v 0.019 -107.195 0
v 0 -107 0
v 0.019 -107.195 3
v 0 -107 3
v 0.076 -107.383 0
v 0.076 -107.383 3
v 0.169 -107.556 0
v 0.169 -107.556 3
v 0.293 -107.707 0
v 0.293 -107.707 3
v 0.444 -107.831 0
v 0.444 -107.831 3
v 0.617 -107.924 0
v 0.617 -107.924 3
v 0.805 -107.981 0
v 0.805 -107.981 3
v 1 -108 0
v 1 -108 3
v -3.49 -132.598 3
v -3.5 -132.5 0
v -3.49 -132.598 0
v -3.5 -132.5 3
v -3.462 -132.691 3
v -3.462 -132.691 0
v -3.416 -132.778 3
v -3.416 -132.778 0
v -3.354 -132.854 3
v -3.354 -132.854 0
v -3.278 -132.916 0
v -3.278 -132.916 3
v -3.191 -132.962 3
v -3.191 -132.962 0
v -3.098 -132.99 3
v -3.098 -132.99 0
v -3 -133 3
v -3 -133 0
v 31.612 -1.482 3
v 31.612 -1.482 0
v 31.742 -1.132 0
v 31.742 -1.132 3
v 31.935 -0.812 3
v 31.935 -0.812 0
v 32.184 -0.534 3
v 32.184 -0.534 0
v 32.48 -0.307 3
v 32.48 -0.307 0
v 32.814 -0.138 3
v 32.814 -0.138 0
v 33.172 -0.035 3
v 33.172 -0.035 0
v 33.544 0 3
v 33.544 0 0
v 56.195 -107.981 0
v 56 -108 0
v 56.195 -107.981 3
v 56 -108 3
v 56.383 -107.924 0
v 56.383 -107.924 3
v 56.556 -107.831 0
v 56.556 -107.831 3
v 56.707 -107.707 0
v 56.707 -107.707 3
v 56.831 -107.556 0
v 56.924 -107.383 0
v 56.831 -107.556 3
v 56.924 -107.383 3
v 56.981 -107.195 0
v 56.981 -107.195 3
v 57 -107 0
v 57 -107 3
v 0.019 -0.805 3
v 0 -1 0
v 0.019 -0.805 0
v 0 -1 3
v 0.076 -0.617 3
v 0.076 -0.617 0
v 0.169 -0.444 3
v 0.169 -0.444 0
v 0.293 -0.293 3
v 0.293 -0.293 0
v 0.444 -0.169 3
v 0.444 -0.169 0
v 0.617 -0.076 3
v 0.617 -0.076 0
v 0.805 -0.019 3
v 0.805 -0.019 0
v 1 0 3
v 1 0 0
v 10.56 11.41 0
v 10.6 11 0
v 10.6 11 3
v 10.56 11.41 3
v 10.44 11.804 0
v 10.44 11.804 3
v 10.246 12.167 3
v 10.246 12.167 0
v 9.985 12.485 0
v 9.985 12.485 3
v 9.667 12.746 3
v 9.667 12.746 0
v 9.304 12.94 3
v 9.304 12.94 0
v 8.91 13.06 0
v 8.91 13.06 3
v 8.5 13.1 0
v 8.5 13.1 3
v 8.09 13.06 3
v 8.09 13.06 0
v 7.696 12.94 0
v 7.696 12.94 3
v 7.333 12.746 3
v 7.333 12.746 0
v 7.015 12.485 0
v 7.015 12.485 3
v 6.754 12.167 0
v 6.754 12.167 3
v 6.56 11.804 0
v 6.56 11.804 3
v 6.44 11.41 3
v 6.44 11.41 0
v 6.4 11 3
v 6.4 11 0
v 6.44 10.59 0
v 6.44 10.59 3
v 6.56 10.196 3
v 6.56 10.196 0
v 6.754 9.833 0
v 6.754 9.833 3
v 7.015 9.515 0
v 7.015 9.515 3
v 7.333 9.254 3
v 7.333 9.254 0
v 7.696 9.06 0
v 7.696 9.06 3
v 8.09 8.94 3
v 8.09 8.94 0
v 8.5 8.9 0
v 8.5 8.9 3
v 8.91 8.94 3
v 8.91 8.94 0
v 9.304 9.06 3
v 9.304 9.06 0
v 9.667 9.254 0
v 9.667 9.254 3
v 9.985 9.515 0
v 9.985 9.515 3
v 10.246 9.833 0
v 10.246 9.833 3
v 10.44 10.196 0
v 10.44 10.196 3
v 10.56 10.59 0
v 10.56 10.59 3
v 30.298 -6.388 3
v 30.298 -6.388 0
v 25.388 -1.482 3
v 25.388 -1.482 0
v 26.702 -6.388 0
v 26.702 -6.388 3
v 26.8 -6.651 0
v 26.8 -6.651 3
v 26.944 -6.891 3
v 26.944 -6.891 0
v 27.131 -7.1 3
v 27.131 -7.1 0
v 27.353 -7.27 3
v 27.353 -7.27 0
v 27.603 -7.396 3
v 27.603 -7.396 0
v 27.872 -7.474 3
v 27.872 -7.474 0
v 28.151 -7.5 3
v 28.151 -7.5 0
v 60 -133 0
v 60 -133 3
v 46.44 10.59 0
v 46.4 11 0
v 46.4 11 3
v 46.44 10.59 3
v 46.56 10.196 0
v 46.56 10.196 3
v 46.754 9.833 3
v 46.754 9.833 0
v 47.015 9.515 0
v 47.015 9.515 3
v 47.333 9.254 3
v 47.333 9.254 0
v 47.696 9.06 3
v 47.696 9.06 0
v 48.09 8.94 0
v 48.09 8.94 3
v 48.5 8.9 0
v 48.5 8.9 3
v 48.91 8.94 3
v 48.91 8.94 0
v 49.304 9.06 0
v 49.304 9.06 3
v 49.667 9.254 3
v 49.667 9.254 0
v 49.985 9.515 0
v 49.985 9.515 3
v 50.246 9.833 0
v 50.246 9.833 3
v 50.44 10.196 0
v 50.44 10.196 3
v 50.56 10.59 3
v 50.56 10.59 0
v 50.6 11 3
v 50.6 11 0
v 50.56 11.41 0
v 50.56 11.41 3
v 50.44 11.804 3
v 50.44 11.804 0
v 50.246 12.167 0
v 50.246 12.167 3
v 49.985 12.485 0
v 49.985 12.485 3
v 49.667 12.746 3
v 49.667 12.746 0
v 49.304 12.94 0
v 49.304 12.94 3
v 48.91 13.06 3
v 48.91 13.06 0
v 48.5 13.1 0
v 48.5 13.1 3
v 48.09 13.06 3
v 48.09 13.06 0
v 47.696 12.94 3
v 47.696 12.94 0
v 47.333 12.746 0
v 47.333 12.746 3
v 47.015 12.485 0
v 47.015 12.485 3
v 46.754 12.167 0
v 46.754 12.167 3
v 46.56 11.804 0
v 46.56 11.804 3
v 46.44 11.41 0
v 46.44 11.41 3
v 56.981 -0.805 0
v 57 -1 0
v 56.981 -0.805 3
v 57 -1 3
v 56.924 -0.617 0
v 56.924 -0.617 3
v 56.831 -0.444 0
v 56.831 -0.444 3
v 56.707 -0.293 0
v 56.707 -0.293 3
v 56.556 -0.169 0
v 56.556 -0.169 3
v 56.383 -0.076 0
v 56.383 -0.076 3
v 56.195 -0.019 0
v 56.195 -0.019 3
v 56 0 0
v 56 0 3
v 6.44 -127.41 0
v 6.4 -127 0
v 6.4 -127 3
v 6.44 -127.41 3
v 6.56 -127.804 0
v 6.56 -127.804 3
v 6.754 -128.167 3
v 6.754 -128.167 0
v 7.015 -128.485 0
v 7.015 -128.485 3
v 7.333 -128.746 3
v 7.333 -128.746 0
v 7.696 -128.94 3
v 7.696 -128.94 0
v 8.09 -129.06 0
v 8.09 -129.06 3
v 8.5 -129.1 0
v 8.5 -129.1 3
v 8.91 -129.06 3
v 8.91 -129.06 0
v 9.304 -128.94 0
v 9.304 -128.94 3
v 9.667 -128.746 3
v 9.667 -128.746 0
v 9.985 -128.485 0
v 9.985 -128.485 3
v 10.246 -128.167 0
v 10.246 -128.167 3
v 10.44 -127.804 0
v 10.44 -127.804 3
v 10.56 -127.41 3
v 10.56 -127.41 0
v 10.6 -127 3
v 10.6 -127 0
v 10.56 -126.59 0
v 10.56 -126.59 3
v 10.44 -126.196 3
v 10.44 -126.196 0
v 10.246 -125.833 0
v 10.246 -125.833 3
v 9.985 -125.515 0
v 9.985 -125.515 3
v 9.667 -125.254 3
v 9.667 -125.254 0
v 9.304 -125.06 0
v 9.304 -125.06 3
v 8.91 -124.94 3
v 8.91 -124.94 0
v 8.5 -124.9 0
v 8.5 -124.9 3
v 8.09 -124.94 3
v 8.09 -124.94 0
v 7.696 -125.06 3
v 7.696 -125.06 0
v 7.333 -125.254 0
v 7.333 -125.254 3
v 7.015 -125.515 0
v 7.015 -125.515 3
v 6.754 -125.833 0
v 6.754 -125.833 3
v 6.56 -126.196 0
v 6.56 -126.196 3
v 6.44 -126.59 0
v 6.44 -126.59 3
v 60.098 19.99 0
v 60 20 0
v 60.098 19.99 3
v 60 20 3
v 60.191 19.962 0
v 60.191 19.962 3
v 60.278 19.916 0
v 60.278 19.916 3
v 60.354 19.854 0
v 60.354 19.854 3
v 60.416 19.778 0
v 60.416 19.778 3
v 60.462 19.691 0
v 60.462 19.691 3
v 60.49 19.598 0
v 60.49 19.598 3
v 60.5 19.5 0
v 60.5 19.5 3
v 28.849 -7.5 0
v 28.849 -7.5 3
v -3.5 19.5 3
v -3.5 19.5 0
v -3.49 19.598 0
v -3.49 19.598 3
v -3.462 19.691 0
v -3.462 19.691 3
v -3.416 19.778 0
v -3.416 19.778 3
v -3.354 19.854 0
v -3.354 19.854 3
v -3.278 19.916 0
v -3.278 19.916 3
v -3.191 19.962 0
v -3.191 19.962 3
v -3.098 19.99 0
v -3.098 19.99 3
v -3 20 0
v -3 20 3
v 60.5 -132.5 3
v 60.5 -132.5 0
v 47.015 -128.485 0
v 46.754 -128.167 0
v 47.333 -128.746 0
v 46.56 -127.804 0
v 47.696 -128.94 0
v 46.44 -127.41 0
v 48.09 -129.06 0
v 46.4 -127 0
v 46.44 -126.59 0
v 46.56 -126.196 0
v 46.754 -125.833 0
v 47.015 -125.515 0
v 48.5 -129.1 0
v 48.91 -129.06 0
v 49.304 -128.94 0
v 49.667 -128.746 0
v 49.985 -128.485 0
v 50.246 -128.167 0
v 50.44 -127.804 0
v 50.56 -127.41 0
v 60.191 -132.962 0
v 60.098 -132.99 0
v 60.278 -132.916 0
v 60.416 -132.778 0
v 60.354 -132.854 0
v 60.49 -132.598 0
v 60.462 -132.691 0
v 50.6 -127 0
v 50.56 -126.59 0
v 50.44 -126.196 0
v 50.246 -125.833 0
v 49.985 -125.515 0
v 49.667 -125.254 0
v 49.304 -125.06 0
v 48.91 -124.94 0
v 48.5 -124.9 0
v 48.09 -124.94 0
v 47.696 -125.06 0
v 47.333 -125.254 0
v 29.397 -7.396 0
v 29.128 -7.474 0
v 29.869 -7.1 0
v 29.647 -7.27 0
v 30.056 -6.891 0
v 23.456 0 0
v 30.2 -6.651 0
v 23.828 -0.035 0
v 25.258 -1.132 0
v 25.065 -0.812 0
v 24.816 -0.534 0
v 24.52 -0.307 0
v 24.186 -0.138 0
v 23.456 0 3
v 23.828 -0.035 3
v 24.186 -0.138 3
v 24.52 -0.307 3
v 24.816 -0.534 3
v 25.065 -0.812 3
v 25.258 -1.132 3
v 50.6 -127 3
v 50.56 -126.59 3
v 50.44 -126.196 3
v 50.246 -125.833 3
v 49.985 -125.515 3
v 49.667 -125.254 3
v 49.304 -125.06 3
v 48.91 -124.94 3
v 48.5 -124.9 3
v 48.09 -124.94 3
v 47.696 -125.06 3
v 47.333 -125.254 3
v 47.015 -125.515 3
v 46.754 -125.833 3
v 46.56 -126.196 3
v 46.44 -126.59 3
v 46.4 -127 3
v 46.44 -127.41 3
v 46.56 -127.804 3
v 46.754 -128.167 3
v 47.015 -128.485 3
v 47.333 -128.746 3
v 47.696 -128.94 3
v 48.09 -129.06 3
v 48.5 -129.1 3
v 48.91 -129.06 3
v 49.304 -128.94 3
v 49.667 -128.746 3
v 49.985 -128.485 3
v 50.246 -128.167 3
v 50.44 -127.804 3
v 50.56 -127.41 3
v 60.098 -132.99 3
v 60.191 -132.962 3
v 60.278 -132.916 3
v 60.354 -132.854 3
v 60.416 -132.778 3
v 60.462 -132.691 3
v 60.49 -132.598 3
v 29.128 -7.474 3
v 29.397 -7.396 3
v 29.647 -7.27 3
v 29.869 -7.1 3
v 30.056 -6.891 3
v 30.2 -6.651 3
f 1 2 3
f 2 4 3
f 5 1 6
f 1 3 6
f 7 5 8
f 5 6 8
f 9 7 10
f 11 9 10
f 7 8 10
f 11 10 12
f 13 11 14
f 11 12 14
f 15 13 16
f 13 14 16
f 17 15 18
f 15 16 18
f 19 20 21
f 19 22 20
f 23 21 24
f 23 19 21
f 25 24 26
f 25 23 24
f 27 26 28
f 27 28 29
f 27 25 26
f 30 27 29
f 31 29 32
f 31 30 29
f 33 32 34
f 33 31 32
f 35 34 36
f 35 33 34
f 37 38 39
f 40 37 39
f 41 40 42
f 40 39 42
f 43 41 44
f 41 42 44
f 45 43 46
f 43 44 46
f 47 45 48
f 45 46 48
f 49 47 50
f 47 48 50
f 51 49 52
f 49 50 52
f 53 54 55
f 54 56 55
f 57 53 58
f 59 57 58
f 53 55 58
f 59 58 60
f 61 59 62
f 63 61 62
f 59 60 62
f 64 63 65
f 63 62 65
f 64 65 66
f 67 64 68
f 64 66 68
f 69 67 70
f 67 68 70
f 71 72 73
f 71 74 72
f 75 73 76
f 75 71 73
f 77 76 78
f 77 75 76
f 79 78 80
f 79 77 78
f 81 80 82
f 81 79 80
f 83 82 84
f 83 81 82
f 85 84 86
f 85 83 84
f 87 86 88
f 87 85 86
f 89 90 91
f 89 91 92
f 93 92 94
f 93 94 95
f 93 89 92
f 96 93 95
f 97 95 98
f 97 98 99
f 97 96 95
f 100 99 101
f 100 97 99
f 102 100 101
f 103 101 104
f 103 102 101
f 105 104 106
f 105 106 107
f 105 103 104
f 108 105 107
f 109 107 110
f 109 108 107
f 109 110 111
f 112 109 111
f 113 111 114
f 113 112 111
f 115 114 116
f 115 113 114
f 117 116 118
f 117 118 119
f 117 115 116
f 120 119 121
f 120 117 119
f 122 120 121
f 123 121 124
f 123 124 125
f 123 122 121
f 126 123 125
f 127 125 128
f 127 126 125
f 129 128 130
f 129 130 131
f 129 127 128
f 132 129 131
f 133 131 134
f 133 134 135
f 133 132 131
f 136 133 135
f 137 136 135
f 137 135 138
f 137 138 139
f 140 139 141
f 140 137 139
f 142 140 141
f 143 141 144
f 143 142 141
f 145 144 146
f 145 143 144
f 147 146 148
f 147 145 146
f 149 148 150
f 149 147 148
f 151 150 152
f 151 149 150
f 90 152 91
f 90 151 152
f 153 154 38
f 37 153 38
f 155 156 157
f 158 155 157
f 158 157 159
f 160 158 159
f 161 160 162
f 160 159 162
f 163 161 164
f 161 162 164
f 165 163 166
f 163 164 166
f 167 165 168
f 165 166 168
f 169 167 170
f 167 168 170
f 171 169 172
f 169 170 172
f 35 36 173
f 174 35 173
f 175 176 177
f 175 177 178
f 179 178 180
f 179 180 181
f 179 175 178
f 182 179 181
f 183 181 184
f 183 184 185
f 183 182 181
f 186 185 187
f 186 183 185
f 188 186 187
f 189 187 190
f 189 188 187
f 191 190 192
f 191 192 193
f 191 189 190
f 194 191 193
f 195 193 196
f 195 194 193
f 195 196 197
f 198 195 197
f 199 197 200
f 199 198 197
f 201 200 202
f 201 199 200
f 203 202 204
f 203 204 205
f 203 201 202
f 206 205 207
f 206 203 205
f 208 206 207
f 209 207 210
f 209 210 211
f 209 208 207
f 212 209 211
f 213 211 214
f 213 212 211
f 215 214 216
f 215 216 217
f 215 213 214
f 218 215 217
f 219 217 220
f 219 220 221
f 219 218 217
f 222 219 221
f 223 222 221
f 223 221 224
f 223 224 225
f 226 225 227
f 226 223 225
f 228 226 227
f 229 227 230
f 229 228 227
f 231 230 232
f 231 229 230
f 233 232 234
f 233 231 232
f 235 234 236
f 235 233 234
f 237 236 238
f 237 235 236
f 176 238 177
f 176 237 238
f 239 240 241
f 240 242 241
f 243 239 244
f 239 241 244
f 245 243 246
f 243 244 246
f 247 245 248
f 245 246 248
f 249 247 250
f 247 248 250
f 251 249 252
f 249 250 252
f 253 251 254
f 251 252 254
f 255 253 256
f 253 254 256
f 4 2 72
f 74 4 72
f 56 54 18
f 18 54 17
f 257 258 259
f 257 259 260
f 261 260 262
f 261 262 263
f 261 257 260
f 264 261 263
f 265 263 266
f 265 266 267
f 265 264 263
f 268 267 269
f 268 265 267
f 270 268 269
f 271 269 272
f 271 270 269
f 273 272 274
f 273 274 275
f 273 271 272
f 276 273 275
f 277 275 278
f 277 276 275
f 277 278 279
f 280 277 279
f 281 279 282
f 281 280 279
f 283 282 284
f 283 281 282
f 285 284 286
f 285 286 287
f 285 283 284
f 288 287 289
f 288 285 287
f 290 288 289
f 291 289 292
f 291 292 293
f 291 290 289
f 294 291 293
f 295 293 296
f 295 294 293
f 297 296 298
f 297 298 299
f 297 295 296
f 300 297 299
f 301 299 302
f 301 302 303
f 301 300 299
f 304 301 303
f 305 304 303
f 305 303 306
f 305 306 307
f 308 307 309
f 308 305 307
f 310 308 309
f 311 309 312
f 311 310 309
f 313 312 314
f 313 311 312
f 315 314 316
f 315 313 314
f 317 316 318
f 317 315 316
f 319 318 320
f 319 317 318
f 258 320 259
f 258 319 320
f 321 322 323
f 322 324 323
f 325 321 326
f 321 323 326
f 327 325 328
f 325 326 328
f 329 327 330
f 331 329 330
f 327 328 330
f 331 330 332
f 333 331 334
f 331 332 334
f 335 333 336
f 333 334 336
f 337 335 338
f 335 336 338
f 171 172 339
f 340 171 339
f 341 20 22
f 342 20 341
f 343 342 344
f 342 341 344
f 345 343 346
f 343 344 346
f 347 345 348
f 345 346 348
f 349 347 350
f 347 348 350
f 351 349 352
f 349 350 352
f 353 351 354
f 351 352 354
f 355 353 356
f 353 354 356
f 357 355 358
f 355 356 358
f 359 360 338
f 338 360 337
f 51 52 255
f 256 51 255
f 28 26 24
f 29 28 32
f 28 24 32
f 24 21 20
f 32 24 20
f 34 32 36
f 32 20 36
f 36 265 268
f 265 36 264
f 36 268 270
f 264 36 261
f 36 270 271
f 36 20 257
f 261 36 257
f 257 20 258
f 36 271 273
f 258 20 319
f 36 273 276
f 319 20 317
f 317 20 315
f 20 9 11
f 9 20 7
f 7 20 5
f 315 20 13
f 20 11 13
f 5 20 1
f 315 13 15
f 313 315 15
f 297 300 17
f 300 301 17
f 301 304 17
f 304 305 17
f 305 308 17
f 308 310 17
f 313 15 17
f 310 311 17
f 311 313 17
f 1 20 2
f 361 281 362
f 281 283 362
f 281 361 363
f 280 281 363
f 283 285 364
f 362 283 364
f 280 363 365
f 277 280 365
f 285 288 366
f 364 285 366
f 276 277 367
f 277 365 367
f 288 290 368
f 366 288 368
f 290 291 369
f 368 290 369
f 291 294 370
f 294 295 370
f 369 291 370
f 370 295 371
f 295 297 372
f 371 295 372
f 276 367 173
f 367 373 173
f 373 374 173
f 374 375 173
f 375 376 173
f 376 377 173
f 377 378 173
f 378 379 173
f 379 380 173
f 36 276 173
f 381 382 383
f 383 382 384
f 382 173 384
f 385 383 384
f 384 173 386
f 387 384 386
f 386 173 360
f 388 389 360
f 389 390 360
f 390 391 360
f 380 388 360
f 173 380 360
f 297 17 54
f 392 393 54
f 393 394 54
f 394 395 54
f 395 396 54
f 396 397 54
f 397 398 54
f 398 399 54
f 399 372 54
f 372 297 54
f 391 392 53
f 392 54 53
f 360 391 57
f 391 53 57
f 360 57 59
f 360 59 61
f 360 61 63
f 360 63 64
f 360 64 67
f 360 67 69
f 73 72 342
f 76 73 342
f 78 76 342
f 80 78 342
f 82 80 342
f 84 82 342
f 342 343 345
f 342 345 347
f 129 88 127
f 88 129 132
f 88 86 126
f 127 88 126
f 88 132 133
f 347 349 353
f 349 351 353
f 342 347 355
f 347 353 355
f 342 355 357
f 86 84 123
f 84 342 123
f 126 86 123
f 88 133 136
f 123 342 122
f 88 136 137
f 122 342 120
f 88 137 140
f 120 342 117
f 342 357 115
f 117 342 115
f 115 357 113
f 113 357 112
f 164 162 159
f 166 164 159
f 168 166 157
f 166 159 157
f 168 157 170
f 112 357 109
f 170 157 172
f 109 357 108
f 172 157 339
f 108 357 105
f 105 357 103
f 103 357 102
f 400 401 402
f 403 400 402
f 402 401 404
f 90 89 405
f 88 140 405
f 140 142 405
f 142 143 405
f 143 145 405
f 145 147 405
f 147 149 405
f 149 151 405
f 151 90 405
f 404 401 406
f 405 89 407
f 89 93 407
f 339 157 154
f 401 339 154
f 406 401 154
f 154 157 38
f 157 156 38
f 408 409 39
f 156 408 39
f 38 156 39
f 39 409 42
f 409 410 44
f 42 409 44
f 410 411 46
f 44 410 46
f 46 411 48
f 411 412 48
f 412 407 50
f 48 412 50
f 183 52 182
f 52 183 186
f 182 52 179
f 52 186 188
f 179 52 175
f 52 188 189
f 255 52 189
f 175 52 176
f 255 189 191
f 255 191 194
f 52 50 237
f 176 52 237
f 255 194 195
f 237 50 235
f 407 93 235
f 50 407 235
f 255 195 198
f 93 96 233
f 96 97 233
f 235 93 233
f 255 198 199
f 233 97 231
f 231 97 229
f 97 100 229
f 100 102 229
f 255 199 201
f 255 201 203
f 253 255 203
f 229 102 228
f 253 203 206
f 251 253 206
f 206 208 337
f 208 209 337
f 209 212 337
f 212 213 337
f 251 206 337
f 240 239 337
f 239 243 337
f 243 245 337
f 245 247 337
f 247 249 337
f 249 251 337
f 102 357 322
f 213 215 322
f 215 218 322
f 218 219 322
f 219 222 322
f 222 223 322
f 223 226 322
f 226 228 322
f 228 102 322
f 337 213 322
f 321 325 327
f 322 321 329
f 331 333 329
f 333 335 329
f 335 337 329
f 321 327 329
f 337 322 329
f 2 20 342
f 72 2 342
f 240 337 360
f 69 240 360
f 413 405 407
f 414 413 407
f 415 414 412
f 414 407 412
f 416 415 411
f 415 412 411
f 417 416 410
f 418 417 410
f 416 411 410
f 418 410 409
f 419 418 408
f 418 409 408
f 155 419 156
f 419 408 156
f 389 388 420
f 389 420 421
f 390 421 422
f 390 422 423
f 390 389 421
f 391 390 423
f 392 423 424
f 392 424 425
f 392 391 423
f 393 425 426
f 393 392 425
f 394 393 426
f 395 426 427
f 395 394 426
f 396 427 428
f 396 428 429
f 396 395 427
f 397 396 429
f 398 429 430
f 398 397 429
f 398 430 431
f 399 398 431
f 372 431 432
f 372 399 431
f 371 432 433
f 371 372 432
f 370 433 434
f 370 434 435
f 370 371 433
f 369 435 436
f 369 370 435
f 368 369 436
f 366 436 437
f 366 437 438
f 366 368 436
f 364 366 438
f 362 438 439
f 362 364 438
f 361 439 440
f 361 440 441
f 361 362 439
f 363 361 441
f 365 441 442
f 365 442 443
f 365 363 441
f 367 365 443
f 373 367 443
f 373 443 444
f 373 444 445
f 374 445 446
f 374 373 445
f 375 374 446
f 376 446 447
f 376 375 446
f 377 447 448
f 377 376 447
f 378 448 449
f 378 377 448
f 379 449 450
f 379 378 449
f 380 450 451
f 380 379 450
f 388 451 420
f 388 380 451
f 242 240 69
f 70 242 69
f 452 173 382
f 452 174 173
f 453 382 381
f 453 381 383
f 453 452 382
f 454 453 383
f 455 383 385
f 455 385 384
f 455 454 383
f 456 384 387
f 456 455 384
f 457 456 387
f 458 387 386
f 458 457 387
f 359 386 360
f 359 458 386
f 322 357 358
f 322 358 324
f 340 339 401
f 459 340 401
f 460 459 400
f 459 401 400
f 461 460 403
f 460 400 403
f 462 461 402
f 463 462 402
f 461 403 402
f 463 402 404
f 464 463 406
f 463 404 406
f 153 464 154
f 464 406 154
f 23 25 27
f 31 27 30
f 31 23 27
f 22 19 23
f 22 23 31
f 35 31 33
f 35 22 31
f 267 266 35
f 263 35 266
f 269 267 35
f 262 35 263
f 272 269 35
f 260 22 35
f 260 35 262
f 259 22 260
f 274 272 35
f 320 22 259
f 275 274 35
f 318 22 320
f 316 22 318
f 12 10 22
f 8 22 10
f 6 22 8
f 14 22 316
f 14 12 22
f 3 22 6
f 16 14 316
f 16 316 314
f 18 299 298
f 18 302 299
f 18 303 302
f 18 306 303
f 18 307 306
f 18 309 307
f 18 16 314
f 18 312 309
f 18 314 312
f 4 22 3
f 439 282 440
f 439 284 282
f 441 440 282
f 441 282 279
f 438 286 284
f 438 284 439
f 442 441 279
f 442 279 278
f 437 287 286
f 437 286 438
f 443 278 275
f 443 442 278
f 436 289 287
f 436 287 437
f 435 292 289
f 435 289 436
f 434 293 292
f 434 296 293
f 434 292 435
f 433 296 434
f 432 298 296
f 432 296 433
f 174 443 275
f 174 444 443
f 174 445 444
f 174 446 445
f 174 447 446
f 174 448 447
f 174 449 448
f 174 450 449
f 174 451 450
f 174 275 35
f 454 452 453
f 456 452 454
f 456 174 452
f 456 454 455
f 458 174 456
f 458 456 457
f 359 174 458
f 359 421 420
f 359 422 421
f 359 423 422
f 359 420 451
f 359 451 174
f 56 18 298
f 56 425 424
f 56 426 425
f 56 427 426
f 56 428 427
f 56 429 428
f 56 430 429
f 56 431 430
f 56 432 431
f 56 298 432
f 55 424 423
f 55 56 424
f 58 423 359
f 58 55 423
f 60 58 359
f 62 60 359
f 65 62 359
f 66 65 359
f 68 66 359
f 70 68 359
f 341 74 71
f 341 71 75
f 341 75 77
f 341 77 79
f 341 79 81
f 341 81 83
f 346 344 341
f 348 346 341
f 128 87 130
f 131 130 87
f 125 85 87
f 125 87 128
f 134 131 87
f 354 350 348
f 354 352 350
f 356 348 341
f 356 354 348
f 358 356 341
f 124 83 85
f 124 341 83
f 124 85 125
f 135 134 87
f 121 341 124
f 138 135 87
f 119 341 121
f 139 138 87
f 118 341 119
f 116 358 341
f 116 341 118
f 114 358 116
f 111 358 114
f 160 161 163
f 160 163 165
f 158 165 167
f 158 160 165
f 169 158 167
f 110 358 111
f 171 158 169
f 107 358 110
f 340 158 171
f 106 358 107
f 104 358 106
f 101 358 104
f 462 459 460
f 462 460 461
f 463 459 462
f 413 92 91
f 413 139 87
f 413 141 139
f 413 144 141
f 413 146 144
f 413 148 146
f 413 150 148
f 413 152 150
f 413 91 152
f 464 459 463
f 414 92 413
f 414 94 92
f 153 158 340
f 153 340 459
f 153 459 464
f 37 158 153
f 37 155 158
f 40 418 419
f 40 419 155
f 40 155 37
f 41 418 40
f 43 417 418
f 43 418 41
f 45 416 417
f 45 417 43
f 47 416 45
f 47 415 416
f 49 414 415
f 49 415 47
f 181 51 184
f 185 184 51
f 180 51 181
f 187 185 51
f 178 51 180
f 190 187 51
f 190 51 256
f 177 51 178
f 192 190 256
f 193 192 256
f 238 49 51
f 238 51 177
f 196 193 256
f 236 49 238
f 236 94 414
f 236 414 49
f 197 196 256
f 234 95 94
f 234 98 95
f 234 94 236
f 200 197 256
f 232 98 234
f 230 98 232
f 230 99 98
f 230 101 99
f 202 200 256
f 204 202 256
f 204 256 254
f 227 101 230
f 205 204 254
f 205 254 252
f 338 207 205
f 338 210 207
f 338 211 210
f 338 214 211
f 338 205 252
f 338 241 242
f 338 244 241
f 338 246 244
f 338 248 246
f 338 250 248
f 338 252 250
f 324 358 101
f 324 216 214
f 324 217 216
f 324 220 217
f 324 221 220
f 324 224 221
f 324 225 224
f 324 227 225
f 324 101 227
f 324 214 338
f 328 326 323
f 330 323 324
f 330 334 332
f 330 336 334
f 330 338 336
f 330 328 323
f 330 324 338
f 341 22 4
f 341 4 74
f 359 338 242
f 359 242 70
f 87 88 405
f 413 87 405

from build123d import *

# Parameters (mm, degrees)
SKETCH1_W           = 64
SKETCH1_H           = 153
SKETCH1_R           = 2.1
BOSS_EXTRUDE1_DEPTH = 3
FILLET2_R           = 0.5
FILLET3_R           = 1


with BuildPart() as part:
    # Sketch1 → Boss-Extrude1 (new body)
    with BuildSketch(Plane.XY):
        with Locations((28.5, -56.5)):
            Rectangle(SKETCH1_W, SKETCH1_H)
        with Locations((8.5, 11)):
            Circle(SKETCH1_R, mode=Mode.SUBTRACT)
        with Locations(Location((48.5, 11, 0), (0, 0, 180))):
            Circle(SKETCH1_R, mode=Mode.SUBTRACT)
        with Locations((48.5, -127)):
            Circle(SKETCH1_R, mode=Mode.SUBTRACT)
        with Locations(Location((8.5, -127, 0), (0, 0, 180))):
            Circle(SKETCH1_R, mode=Mode.SUBTRACT)
        with BuildLine():
            Line((0, 0), (23.455727081, 0))
            ThreePointArc((23.455727081, 0), (24.673249939, -0.413293319), (25.387578733, -1.48236191))
            Line((25.387578733, -1.48236191), (26.702101743, -6.388228568))
            ThreePointArc((26.702101743, -6.388228568), (27.237848338, -7.19003001), (28.150990482, -7.5))
            Line((28.150990482, -7.5), (28.849009518, -7.5))
            ThreePointArc((28.849009518, -7.5), (29.762151662, -7.19003001), (30.297898257, -6.388228568))
            Line((30.297898257, -6.388228568), (31.612421267, -1.48236191))
            ThreePointArc((31.612421267, -1.48236191), (32.326750061, -0.413293319), (33.544272919, 0))
            Line((33.544272919, 0), (57, 0))
            Line((57, 0), (57, -108))
            Line((57, -108), (0, -108))
            Line((0, -108), (0, 0))
        make_face(mode=Mode.SUBTRACT)
    extrude(amount=BOSS_EXTRUDE1_DEPTH)

    # Fillet2
    fillet2_edges = [part.edges().sort_by_distance(p)[0] for p in [
        (-3.5, 20, 1.5),
        (60.5, 20, 1.5),
        (60.5, -133, 1.5),
        (-3.5, -133, 1.5),
    ]]
    fillet(fillet2_edges, radius=FILLET2_R)

    # Fillet3
    fillet3_edges = [part.edges().sort_by_distance(p)[0] for p in [
        (0, 0, 1.5),
        (0, -108, 1.5),
        (57, -108, 1.5),
        (57, 0, 1.5),
    ]]
    fillet(fillet3_edges, radius=FILLET3_R)


solid = part.part
